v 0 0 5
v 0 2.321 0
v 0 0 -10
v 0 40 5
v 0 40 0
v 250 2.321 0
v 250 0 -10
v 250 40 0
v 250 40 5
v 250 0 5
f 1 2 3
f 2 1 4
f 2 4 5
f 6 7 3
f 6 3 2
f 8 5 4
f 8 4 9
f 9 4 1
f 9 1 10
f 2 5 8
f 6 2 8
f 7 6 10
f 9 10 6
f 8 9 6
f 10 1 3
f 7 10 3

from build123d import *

# Parameters (mm, degrees)
ESQUISSE1_W        = 250
ESQUISSE1_H        = 40
BOSS_EXTRU_1_DEPTH = 5
BOSS_EXTRU_2_DEPTH = 250


with BuildPart() as part:
    # Esquisse1 → Boss.-Extru.1 (new body)
    with BuildSketch(Plane.XY):
        with Locations((125, 20)):
            Rectangle(ESQUISSE1_W, ESQUISSE1_H)
    extrude(amount=BOSS_EXTRU_1_DEPTH)

    # Esquisse2 → Boss.-Extru.2 (add)
    with BuildSketch(Plane.ZY):
        Polygon((0, 0), (-10, 0), (0, 2.320632566), align=None)
    extrude(amount=-BOSS_EXTRU_2_DEPTH)


solid = part.part
